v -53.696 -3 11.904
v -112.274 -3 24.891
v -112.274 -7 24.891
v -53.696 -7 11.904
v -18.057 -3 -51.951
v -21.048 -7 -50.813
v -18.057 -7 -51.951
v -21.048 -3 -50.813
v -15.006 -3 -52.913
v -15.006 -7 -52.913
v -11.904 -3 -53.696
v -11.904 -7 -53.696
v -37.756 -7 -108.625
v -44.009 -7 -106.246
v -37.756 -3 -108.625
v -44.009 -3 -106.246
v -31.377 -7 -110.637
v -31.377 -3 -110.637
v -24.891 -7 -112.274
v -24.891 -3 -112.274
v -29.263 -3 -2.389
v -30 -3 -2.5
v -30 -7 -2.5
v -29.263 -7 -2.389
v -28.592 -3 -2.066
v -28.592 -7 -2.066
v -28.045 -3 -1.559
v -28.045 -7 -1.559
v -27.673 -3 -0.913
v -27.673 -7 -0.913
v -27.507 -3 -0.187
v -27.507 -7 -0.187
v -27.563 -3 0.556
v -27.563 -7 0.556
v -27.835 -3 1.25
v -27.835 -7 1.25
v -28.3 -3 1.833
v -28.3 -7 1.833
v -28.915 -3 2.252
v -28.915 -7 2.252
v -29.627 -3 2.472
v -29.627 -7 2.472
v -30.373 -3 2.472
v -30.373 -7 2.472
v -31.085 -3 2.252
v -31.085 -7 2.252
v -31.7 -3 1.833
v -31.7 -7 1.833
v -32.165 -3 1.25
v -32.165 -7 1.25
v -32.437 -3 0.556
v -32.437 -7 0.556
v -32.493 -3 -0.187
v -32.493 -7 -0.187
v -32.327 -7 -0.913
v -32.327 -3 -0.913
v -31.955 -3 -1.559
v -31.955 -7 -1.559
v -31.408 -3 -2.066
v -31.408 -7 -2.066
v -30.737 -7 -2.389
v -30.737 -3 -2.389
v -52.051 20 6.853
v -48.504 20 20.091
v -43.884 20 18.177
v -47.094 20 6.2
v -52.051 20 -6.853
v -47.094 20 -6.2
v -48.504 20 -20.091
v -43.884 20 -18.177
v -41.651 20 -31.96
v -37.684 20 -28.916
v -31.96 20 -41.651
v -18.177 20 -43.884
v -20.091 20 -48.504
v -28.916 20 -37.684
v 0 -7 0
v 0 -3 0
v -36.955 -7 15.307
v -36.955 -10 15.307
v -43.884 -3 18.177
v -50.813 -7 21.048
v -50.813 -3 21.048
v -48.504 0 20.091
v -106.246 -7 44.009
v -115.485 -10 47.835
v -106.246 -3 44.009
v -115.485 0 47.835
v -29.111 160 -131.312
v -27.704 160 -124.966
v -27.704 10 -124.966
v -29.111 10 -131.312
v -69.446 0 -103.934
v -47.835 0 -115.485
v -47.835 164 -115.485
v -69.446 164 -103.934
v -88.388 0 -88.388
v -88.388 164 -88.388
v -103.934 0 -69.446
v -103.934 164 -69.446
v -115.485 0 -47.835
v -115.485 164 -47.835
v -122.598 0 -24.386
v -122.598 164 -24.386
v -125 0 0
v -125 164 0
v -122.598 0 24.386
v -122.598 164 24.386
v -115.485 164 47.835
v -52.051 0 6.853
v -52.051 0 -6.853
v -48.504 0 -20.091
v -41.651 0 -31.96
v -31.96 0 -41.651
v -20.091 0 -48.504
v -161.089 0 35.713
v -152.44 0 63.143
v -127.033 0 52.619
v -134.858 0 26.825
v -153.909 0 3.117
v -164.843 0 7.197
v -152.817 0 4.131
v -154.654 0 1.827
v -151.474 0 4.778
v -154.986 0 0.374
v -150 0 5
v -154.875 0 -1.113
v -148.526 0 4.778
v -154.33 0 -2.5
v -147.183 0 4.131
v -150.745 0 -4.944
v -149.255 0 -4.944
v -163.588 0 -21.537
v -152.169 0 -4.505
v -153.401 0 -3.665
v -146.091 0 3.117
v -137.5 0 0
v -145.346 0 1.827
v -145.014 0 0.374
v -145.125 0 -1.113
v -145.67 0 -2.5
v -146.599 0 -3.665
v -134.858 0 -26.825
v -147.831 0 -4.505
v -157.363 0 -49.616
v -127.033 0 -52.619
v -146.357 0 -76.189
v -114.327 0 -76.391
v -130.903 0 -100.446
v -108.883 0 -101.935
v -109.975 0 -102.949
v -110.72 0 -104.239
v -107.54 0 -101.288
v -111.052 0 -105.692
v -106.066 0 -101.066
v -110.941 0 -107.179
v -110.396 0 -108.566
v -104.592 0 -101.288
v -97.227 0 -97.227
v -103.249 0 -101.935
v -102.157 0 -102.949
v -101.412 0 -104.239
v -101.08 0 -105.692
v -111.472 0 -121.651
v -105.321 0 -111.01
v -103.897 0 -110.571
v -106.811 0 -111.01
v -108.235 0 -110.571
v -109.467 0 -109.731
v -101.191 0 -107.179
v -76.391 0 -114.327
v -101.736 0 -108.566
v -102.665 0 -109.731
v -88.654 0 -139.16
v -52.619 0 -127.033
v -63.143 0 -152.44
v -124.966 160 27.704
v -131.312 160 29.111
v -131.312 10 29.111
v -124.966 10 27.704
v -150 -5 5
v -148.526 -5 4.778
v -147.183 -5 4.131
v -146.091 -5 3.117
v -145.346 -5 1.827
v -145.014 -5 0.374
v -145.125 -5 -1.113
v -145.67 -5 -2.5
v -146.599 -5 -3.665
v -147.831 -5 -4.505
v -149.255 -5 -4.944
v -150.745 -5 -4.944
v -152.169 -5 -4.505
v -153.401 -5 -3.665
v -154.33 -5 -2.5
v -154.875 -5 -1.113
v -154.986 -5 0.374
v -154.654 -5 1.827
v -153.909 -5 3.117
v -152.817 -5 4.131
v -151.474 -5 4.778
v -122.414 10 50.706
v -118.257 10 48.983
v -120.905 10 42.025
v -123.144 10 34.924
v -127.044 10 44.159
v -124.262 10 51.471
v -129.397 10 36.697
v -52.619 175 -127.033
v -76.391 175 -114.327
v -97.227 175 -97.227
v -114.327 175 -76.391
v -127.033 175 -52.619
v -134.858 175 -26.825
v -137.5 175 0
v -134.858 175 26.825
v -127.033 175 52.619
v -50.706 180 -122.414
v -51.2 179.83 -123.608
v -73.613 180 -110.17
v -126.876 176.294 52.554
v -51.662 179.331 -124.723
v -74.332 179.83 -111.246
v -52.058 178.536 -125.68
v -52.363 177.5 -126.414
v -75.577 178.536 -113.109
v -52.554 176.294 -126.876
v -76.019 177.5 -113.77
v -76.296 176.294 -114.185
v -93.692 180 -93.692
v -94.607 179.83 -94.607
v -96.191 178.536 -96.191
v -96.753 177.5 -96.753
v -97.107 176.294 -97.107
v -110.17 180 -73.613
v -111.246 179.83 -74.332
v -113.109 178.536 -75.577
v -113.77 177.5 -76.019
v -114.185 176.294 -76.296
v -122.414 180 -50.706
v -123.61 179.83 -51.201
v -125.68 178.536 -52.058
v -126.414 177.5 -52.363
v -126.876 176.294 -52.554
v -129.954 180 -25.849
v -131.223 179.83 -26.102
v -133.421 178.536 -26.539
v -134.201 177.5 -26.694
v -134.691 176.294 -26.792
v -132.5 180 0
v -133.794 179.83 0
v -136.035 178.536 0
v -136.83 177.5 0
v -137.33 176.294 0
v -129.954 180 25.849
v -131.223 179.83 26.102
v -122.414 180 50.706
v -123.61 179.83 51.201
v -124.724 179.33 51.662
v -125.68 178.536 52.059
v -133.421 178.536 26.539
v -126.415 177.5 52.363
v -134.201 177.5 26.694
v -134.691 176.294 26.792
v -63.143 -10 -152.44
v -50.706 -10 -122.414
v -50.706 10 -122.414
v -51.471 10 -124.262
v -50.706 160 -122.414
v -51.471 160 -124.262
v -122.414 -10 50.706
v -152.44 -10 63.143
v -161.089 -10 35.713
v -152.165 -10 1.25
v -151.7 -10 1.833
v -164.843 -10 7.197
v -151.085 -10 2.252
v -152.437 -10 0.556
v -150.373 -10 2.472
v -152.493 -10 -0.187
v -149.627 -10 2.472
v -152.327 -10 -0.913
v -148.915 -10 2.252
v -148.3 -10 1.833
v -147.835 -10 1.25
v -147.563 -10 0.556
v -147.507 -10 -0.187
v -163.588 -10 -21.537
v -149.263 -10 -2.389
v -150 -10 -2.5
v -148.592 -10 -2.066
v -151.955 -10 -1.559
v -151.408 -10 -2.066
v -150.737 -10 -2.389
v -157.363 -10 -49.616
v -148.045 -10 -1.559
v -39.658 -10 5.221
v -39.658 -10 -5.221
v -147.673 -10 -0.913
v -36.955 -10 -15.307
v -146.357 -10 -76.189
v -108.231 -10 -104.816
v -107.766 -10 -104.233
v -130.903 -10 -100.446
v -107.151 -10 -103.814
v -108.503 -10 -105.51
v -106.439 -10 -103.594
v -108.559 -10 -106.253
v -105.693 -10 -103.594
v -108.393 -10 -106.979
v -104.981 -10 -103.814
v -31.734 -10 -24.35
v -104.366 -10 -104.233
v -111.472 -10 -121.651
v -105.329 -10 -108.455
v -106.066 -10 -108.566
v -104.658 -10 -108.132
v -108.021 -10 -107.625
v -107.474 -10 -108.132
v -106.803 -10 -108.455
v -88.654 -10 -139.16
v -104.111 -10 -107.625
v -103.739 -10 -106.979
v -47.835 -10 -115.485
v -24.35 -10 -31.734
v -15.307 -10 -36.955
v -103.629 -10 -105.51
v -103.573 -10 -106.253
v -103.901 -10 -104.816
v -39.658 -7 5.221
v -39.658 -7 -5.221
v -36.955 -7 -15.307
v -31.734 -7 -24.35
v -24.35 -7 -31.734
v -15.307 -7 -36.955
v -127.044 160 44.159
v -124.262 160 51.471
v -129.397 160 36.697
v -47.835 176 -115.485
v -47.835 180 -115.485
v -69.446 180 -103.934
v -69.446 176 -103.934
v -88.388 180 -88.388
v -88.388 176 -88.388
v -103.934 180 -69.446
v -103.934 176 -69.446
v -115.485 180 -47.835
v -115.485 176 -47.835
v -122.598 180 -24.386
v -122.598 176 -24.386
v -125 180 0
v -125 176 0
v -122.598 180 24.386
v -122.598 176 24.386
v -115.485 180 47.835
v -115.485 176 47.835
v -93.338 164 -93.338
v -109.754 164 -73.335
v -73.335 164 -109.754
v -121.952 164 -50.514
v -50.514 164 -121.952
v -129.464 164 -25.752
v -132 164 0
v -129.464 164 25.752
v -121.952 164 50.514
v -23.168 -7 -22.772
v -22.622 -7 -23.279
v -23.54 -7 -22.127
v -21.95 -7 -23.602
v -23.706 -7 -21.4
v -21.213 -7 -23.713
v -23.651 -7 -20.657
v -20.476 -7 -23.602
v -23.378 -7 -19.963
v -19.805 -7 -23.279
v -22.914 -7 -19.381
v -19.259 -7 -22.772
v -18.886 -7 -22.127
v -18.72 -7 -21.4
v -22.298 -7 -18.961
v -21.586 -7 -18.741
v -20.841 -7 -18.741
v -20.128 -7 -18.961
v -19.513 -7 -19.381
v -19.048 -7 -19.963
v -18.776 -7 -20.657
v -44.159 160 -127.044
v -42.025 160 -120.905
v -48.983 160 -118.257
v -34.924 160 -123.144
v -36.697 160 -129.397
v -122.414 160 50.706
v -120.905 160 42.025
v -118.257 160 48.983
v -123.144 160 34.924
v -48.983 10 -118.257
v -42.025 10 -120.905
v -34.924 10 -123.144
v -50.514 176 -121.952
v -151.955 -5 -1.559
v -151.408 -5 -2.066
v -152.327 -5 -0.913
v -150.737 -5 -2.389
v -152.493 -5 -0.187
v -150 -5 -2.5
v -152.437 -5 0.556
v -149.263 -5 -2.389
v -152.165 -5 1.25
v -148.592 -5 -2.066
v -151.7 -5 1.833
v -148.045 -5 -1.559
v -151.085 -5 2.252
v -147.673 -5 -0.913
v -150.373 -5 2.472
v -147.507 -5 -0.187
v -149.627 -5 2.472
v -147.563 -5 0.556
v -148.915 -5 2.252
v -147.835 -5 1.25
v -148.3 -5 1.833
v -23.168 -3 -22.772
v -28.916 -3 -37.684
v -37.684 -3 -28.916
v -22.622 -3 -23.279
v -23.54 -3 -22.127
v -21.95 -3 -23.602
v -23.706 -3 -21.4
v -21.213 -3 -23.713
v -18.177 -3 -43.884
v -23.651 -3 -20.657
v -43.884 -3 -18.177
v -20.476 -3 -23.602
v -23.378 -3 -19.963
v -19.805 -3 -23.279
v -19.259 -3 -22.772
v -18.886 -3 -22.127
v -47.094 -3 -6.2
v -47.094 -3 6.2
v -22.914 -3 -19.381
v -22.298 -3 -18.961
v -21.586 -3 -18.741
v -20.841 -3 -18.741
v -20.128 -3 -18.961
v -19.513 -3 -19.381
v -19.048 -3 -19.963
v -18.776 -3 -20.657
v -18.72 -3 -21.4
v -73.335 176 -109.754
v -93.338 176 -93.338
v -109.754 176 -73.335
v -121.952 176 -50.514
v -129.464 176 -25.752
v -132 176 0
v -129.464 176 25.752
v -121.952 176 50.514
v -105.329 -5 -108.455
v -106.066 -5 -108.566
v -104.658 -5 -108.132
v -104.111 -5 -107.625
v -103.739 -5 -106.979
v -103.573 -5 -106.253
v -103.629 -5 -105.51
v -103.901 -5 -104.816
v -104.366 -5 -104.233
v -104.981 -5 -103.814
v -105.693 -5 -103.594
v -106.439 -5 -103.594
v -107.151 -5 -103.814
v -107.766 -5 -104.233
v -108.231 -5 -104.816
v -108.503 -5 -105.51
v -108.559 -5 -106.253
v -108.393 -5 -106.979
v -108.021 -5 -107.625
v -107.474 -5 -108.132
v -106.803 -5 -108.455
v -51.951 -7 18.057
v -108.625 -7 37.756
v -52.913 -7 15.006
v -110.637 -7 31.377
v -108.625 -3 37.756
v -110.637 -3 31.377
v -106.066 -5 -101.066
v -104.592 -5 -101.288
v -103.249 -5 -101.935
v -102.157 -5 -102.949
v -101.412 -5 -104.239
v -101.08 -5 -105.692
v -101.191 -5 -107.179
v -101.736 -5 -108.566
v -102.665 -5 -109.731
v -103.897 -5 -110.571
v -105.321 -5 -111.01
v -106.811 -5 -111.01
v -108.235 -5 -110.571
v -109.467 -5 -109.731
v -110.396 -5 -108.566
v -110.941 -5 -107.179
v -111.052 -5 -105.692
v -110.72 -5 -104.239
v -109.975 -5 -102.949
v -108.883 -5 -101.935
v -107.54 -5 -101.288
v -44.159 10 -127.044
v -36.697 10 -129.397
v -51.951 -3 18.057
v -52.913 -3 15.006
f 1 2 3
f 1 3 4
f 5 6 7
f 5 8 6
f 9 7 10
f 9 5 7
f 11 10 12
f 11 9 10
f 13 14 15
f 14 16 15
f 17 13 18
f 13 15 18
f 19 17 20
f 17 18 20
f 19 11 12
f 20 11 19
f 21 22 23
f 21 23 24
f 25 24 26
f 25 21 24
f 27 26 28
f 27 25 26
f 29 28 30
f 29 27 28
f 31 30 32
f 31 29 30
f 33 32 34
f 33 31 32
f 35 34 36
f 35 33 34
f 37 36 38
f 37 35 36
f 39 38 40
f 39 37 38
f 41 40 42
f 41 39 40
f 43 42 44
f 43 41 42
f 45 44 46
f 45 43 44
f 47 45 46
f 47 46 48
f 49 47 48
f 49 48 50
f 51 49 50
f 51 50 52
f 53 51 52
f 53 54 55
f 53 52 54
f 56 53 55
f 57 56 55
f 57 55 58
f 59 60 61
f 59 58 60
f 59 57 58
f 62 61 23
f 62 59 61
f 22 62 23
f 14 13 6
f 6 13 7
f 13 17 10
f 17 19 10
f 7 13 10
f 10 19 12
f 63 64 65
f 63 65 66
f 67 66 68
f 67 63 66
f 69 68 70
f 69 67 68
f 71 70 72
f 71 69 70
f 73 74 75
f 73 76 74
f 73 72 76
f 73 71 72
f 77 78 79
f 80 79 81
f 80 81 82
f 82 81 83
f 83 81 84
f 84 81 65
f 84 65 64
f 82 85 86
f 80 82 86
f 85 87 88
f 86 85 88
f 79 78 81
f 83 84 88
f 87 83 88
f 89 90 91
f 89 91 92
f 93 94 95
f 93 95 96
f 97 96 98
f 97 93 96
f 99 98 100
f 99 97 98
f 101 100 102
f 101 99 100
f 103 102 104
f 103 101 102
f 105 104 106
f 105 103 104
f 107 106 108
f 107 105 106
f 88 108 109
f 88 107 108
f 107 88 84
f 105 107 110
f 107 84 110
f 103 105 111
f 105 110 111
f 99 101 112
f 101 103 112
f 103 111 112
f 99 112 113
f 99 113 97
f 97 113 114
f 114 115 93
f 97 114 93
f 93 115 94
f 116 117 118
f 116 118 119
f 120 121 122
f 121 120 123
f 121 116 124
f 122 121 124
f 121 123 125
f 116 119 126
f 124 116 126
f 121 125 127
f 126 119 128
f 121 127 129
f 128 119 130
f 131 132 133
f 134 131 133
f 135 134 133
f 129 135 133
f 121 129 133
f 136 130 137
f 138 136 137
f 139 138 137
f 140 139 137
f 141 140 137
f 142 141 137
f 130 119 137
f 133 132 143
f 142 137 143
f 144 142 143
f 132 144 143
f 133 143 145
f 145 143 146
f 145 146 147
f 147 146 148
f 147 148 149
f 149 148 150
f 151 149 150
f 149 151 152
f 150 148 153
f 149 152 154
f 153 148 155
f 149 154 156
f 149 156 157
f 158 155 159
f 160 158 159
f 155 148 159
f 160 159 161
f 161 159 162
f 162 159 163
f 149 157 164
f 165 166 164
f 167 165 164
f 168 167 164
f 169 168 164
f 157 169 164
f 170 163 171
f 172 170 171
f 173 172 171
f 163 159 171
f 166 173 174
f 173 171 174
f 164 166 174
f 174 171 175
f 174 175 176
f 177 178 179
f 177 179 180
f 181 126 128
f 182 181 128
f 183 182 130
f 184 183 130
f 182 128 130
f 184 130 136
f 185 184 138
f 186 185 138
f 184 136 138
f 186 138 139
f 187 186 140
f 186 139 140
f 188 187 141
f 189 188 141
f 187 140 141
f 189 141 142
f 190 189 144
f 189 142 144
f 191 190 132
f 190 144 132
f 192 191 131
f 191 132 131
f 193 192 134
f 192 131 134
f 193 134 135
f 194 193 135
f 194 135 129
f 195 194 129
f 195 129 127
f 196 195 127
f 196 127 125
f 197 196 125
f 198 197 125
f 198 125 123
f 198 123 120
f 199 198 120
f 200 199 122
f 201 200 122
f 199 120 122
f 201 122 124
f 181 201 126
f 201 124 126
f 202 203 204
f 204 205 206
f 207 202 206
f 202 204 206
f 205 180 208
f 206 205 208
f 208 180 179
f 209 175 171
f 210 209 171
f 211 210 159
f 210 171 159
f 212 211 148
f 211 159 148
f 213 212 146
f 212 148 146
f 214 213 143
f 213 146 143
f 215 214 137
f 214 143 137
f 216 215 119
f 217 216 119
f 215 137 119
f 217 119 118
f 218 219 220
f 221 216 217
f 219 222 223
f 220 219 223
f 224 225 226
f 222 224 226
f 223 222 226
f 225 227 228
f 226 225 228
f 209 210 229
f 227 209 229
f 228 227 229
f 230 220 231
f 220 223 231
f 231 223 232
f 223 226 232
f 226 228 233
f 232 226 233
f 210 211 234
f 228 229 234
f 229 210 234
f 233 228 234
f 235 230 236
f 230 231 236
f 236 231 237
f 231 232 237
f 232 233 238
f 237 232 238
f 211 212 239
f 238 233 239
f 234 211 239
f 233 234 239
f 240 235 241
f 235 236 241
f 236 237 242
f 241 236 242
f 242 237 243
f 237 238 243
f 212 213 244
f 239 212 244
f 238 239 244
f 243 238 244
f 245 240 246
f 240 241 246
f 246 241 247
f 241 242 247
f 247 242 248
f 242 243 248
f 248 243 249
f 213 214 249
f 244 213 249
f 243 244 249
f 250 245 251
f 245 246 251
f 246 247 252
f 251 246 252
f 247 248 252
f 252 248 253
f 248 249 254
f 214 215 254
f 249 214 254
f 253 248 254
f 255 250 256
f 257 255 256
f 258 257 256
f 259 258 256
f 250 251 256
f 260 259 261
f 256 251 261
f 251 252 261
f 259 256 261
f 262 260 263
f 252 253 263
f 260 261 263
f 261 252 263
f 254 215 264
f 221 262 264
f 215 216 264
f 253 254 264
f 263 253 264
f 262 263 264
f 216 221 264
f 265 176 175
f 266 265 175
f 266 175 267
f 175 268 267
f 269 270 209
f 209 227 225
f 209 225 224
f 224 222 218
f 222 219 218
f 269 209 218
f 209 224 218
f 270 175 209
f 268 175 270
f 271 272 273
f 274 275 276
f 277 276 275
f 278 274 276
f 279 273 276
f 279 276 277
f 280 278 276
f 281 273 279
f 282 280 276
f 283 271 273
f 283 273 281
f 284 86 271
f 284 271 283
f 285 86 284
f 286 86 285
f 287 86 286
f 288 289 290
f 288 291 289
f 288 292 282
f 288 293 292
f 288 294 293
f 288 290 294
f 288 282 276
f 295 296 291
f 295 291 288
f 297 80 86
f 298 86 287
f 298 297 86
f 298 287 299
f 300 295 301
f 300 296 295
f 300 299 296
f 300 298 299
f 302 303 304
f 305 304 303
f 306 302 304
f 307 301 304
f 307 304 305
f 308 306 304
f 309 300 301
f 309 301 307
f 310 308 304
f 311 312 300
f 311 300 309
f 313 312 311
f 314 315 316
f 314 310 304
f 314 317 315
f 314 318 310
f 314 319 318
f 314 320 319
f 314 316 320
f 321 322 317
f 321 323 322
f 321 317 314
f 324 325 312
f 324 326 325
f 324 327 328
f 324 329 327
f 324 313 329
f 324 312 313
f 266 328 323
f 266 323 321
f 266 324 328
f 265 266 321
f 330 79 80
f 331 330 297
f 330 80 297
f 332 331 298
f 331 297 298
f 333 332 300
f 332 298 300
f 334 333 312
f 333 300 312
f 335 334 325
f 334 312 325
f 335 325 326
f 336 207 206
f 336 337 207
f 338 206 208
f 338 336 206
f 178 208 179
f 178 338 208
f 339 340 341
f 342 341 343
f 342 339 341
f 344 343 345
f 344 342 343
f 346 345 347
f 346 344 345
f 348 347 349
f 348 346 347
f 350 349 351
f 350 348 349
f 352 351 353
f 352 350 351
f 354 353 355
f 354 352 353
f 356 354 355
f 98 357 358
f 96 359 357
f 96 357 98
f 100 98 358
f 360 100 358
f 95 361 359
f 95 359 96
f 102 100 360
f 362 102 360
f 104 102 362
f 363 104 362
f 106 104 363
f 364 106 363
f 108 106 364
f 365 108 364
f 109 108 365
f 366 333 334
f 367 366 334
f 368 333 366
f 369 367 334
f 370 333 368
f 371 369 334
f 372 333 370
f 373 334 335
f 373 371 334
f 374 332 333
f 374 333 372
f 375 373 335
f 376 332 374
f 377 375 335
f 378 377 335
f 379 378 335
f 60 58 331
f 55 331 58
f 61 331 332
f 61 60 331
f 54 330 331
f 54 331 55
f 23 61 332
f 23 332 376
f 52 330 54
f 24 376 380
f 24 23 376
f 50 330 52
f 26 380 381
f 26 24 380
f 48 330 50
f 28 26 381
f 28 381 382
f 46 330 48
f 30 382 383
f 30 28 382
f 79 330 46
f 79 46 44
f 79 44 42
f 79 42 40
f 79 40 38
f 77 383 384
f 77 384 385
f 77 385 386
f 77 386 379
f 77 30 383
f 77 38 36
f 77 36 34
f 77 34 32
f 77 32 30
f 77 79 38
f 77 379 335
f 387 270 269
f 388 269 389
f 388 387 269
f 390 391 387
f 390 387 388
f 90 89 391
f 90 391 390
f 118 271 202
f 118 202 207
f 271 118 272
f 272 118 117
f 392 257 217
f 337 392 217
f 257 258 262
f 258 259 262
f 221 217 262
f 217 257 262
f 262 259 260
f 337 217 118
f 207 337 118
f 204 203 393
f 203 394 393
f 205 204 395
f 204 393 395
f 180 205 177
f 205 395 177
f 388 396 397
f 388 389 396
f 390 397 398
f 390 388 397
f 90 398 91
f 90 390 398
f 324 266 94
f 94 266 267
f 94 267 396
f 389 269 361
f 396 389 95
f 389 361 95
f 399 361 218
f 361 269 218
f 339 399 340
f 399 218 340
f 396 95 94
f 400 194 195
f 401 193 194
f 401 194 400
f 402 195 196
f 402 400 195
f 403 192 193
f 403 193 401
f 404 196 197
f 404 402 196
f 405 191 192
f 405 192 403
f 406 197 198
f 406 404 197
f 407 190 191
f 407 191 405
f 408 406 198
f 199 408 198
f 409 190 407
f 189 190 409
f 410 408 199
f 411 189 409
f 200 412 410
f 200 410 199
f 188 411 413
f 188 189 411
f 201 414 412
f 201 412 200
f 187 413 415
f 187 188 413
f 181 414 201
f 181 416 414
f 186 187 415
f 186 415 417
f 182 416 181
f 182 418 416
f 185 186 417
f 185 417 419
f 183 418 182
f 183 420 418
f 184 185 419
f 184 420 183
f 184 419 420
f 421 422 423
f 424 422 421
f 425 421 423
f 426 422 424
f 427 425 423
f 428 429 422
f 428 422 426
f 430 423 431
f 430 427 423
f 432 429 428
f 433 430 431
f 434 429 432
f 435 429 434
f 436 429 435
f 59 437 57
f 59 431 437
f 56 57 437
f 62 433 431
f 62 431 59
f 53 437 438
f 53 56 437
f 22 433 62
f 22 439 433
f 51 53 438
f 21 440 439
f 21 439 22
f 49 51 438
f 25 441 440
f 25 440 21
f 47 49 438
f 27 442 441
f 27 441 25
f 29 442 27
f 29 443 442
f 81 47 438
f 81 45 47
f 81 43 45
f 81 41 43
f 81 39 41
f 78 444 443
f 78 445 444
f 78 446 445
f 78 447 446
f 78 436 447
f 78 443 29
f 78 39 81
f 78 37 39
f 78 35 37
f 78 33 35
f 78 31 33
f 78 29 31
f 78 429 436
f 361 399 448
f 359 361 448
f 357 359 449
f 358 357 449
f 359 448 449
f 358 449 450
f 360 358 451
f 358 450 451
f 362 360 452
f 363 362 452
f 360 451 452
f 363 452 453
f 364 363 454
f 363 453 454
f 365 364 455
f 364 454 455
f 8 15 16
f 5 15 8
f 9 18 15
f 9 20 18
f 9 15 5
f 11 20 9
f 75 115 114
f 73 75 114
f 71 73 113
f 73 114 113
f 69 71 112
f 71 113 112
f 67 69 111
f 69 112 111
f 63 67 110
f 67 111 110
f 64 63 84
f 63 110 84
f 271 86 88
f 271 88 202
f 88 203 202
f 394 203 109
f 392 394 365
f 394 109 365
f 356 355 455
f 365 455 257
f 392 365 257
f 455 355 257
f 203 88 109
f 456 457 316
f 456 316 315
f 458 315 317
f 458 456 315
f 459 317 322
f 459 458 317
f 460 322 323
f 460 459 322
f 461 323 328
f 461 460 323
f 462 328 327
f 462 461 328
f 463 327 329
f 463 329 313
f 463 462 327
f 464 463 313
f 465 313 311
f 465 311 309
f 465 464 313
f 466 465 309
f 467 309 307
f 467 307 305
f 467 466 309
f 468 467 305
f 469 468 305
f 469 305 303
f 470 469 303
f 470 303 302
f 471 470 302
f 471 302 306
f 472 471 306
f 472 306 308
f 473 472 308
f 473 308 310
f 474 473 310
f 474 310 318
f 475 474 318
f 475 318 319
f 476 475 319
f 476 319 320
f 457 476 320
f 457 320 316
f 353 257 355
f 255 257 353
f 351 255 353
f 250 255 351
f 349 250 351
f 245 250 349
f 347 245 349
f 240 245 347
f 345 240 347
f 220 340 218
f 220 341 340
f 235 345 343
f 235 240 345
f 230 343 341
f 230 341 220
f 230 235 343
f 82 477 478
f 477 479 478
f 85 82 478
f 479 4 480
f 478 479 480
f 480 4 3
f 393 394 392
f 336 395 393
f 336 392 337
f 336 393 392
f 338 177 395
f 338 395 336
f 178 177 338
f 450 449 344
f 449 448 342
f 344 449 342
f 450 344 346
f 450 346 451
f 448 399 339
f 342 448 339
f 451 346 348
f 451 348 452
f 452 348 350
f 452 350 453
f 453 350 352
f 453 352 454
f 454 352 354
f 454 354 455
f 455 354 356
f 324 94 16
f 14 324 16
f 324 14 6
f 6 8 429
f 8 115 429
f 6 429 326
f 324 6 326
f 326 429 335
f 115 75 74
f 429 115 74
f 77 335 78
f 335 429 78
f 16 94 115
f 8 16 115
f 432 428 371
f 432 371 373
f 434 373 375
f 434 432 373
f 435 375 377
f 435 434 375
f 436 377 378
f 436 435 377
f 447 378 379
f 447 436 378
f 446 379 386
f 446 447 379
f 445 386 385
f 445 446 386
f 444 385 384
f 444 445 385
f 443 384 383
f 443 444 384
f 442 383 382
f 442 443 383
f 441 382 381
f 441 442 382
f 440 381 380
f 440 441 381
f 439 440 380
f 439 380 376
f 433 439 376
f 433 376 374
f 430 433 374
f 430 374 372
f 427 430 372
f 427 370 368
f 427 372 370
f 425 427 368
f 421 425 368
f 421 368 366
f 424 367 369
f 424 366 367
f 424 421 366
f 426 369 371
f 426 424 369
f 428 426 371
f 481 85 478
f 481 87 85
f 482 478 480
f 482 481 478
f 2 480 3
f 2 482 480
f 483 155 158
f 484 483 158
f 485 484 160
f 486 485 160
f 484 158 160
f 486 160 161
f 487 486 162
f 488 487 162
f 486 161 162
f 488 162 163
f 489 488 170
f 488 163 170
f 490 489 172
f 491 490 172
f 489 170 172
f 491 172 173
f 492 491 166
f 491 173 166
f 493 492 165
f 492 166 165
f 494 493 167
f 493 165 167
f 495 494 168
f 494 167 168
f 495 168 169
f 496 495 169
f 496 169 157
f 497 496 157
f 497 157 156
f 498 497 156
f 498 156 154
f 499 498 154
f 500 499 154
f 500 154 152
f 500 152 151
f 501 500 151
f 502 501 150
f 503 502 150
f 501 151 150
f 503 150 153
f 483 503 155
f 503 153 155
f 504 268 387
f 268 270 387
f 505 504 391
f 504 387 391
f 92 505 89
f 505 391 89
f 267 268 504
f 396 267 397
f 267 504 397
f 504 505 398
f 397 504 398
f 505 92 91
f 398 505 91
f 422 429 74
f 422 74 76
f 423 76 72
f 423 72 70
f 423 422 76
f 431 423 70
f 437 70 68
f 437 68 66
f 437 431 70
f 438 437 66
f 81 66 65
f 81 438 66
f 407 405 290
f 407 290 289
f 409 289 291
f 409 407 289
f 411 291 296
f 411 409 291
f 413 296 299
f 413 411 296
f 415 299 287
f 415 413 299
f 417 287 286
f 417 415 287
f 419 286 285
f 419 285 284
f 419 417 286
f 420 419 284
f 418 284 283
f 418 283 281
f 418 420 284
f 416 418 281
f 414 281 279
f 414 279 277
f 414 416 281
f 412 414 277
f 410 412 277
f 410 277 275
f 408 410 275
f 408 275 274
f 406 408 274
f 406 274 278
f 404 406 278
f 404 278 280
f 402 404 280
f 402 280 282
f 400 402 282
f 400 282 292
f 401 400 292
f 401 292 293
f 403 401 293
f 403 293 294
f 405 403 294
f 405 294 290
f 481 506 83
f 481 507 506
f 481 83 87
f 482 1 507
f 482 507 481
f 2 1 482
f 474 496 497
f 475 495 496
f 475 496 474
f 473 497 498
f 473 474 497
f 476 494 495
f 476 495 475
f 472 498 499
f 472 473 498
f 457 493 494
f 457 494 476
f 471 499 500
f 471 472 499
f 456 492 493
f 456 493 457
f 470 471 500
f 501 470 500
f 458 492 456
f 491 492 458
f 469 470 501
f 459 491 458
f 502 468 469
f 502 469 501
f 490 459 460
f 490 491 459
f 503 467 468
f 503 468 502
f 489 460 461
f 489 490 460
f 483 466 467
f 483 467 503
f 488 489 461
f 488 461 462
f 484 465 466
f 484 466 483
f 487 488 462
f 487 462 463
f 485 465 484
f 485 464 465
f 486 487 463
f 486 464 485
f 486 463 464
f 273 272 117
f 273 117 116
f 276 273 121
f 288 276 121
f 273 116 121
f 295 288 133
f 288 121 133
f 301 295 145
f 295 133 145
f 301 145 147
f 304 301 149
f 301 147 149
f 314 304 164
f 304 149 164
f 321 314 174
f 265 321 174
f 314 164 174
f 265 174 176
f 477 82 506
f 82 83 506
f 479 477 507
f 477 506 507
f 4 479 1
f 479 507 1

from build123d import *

# Parameters (mm, degrees)
SKETCH1_R           = 137.5
SKETCH1_R_2         = 125
BOSS_EXTRUDE1_DEPTH = 180
SKETCH2_R           = 165
SKETCH2_R_2         = 2.5
BOSS_EXTRUDE2_DEPTH = 10
SKETCH3_R           = 52.5
SKETCH3_R_2         = 47.5
BOSS_EXTRUDE3_DEPTH = 20
SKETCH4_W           = 56
SKETCH4_H           = 96
CUT_EXTRUDE4_DEPTH  = 150
SKETCH5_W           = 56
SKETCH5_H           = 10
BOSS_EXTRUDE4_DEPTH = 56
SKETCH6_W           = 56
SKETCH6_H           = 56
BOSS_EXTRUDE5_DEPTH = 10
SKETCH7_R           = 2.5
SKETCH7_R_2         = 12.5
CUT_EXTRUDE5_DEPTH  = 10
SKETCH8_W           = 56
SKETCH8_H           = 86
BOSS_EXTRUDE6_DEPTH = 5
FILLET1_R           = 10
FILLET2_R           = 5
SKETCH9_W           = 31.730677801
SKETCH9_H           = 6
CUT_EXTRUDE6_DEPTH  = 10
FILLET3_R           = 5
CUT_EXTRUDE7_START  = -3
SKETCH10_R          = 47.5
CUT_EXTRUDE7_DEPTH  = 3
SKETCH11_R          = 5
CUT_EXTRUDE8_DEPTH  = 5
SKETCH13_W          = 14
SKETCH13_H          = 12
CUT_EXTRUDE9_DEPTH  = 301.915270467
SKETCH15_W          = 6.5
SKETCH15_H          = 150
SKETCH15_W_2        = 60
SKETCH15_H_2        = 4
REVOLVE1_ANGLE      = 10
SKETCH16_W          = 6.5
SKETCH16_H          = 150
SKETCH16_W_2        = 60
SKETCH16_H_2        = 4
CUT_REVOLVE2_ANGLE  = 10
SKETCH17_R          = 40
CUT_EXTRUDE10_DEPTH = 3


with BuildPart() as part:
    # Sketch1 → Boss-Extrude1 (new body)
    with BuildSketch(Plane(origin=(0, 0, 0), x_dir=(1, 0, 0), z_dir=(0, 1, 0))):
        with Locations(Location((0, 0, 0), (0, 0, 90))):
            Circle(SKETCH1_R)
        with Locations(Location((0, 0, 0), (0, 0, 90))):
            Circle(SKETCH1_R_2, mode=Mode.SUBTRACT)
    extrude(amount=BOSS_EXTRUDE1_DEPTH)

    # Sketch2 → Boss-Extrude2 (add)
    with BuildSketch(Plane.XZ):
        with Locations(Location((0, 0, 0), (0, 0, 270))):
            Circle(SKETCH2_R)
        with Locations(Location((0, 150, 0), (0, 0, 270))):
            Circle(SKETCH2_R_2, mode=Mode.SUBTRACT)
        with Locations(Location((0, 30, 0), (0, 0, 270))):
            Circle(SKETCH2_R_2, mode=Mode.SUBTRACT)
        with Locations(Location((106.066017178, 106.066017178, 0), (0, 0, 270))):
            Circle(SKETCH2_R_2, mode=Mode.SUBTRACT)
        with Locations(Location((150, 0, 0), (0, 0, 270))):
            Circle(SKETCH2_R_2, mode=Mode.SUBTRACT)
        with Locations(Location((106.066017178, -106.066017178, 0), (0, 0, 270))):
            Circle(SKETCH2_R_2, mode=Mode.SUBTRACT)
        with Locations(Location((0, -150, 0), (0, 0, 270))):
            Circle(SKETCH2_R_2, mode=Mode.SUBTRACT)
        with Locations(Location((-106.066017178, -106.066017178, 0), (0, 0, 270))):
            Circle(SKETCH2_R_2, mode=Mode.SUBTRACT)
        with Locations(Location((-150, 0, 0), (0, 0, 270))):
            Circle(SKETCH2_R_2, mode=Mode.SUBTRACT)
        with Locations(Location((-106.066017178, 106.066017178, 0), (0, 0, 270))):
            Circle(SKETCH2_R_2, mode=Mode.SUBTRACT)
        with Locations(Location((21.213203436, 21.213203436, 0), (0, 0, 270))):
            Circle(SKETCH2_R_2, mode=Mode.SUBTRACT)
        with Locations(Location((30, 0, 0), (0, 0, 270))):
            Circle(SKETCH2_R_2, mode=Mode.SUBTRACT)
        with Locations(Location((21.213203436, -21.213203436, 0), (0, 0, 270))):
            Circle(SKETCH2_R_2, mode=Mode.SUBTRACT)
        with Locations(Location((0, -30, 0), (0, 0, 270))):
            Circle(SKETCH2_R_2, mode=Mode.SUBTRACT)
        with Locations(Location((-21.213203436, -21.213203436, 0), (0, 0, 270))):
            Circle(SKETCH2_R_2, mode=Mode.SUBTRACT)
        with Locations(Location((-30, 0, 0), (0, 0, 270))):
            Circle(SKETCH2_R_2, mode=Mode.SUBTRACT)
        with Locations(Location((-21.213203436, 21.213203436, 0), (0, 0, 270))):
            Circle(SKETCH2_R_2, mode=Mode.SUBTRACT)
    extrude(amount=BOSS_EXTRUDE2_DEPTH)

    # Sketch3 → Boss-Extrude3 (add)
    with BuildSketch(Plane(origin=(0, 0, 0), x_dir=(1, 0, 0), z_dir=(0, 1, 0))):
        with Locations(Location((0, 0, 0), (0, 0, 90))):
            Circle(SKETCH3_R)
        with Locations(Location((0, 0, 0), (0, 0, 270))):
            Circle(SKETCH3_R_2, mode=Mode.SUBTRACT)
    extrude(amount=BOSS_EXTRUDE3_DEPTH)

    # Sketch4 → Cut-Extrude4 (cut)
    with BuildSketch(Plane(origin=(0, 0, 0), x_dir=(0, 0, -1), z_dir=(1, 0, 0))):
        with Locations((0, 112)):
            Rectangle(SKETCH4_W, SKETCH4_H)
    extrude(amount=CUT_EXTRUDE4_DEPTH, mode=Mode.SUBTRACT)

    # Sketch5 → Boss-Extrude4 (add)
    with BuildSketch(Plane(origin=(0, 0, 28), x_dir=(-1, 0, 0), z_dir=(0, 0, -1))):
        with Locations((-121.823643025, 135)):
            Rectangle(SKETCH5_W, SKETCH5_H)
    extrude(amount=BOSS_EXTRUDE4_DEPTH)

    # Sketch6 → Boss-Extrude5 (add)
    with BuildSketch(Plane(origin=(0, 64, 0), x_dir=(1, 0, 0), z_dir=(0, 1, 0))):
        with Locations((121.823643025, 0)):
            Rectangle(SKETCH6_W, SKETCH6_H)
    extrude(amount=-BOSS_EXTRUDE5_DEPTH)

    # Sketch7 → Cut-Extrude5 (cut)
    with BuildSketch(Plane(origin=(0, 140, 0), x_dir=(1, 0, 0), z_dir=(0, 1, 0))):
        with Locations(Location((98.273643025, 23.55, 0), (0, 0, 270))):
            Circle(SKETCH7_R)
        with Locations(Location((145.373643025, 23.55, 0), (0, 0, 270))):
            Circle(SKETCH7_R)
        with Locations(Location((98.273643025, -23.55, 0), (0, 0, 270))):
            Circle(SKETCH7_R)
        with Locations(Location((145.373643025, -23.55, 0), (0, 0, 270))):
            Circle(SKETCH7_R)
        with Locations(Location((121.823643025, 0, 0), (0, 0, 270))):
            Circle(SKETCH7_R_2)
    extrude(amount=-CUT_EXTRUDE5_DEPTH, mode=Mode.SUBTRACT)

    # Sketch8 → Boss-Extrude6 (add)
    with BuildSketch(Plane(origin=(149.823643025, 0, 0), x_dir=(0, 0, -1), z_dir=(1, 0, 0))):
        with Locations((0, 97)):
            Rectangle(SKETCH8_W, SKETCH8_H)
    extrude(amount=BOSS_EXTRUDE6_DEPTH)

    # Fillet1
    # the kernel refuses this fillet: 10 mm, written as the material it takes off along each edge
    with BuildSketch(Plane(origin=(154.823643025, 165, -28), x_dir=(0, 0, 1), z_dir=(0, -1, 0))) as fillet1_piece_1:
        with BuildLine():
            CenterArc((FILLET1_R, FILLET1_R), FILLET1_R, 180, 90)
            Line((0, FILLET1_R), (0, 0))
            Line((0, 0), (FILLET1_R, 0))
        make_face()
    extrude(amount=136, mode=Mode.SUBTRACT)
    with BuildSketch(Plane(origin=(154.823643025, 29, 28), x_dir=(-1, 0, 0), z_dir=(0, 1, 0))) as fillet1_piece_2:
        with BuildLine():
            CenterArc((FILLET1_R, -FILLET1_R), FILLET1_R, 90, 90)
            Line((0, -FILLET1_R), (0, 0))
            Line((0, 0), (FILLET1_R, 0))
        make_face()
    extrude(amount=136, mode=Mode.SUBTRACT)

    # Fillet2
    fillet2_edges = [part.edges().sort_by_distance(p)[0] for p in [
        (93.823643025, 59, 28),
        (93.823643025, 59, -28),
        (93.823643025, 135, -28),
        (93.823643025, 135, 28),
    ]]
    fillet(fillet2_edges, radius=FILLET2_R)

    # Sketch9 → Cut-Extrude6 (cut)
    with BuildSketch(Plane(origin=(0, 140, 0), x_dir=(1, 0, 0), z_dir=(0, 1, 0))):
        with Locations((93.823643026, 0)):
            Rectangle(SKETCH9_W, SKETCH9_H)
    extrude(amount=-CUT_EXTRUDE6_DEPTH, mode=Mode.SUBTRACT)

    # Fillet3
    fillet3_edges = [part.edges().sort_by_distance(p)[0] for p in [
        (0, 180, 137.5),
    ]]
    fillet(fillet3_edges, radius=FILLET3_R)

    # Sketch10 → Cut-Extrude7 (cut)
    with BuildSketch(Plane(origin=(0, 0, 0), x_dir=(1, 0, 0), z_dir=(0, 1, 0)).offset(CUT_EXTRUDE7_START)):
        with Locations(Location((0, 0, 0), (0, 0, 270))):
            Circle(SKETCH10_R)
    extrude(amount=CUT_EXTRUDE7_DEPTH, mode=Mode.SUBTRACT)

    # Sketch11 → Cut-Extrude8 (cut)
    with BuildSketch(Plane(origin=(0, 0, 0), x_dir=(1, 0, 0), z_dir=(0, 1, 0))):
        with Locations(Location((0, 150, 0), (0, 0, 270))):
            Circle(SKETCH11_R)
        with Locations(Location((106.066017178, 106.066017178, 0), (0, 0, 270))):
            Circle(SKETCH11_R)
        with Locations(Location((150, 0, 0), (0, 0, 270))):
            Circle(SKETCH11_R)
        with Locations(Location((106.066017178, -106.066017178, 0), (0, 0, 270))):
            Circle(SKETCH11_R)
        with Locations(Location((0, -150, 0), (0, 0, 270))):
            Circle(SKETCH11_R)
        with Locations(Location((-106.066017178, -106.066017178, 0), (0, 0, 270))):
            Circle(SKETCH11_R)
        with Locations(Location((-150, 0, 0), (0, 0, 270))):
            Circle(SKETCH11_R)
        with Locations(Location((-106.066017178, 106.066017178, 0), (0, 0, 270))):
            Circle(SKETCH11_R)
    extrude(amount=-CUT_EXTRUDE8_DEPTH, mode=Mode.SUBTRACT)

    # Sketch13 → Cut-Revolve1 (revolve, cut)
    with BuildSketch(Plane.XY, mode=Mode.PRIVATE) as cut_revolve1_sk:
        with Locations((-125, 170)):
            Rectangle(SKETCH13_W, SKETCH13_H)
    revolve(cut_revolve1_sk.sketch.rotate(Axis((0, 0, 0), (0, 1, 0)), 90), axis=Axis((0, 0, 0), (0, 1, 0)), mode=Mode.SUBTRACT)

    # Sketch14 → Cut-Extrude9 (cut, through all)
    with BuildSketch(Plane(origin=(0, 180, 0), x_dir=(1, 0, 0), z_dir=(0, 1, 0))):
        with BuildLine():
            Line((-47.835429046, 115.484941564), (0, 0))
            Line((0, 0), (115.484941564, 47.835429046))
            ThreePointArc((115.484941564, 47.835429046), (47.835429046, 115.484941564), (-47.835429046, 115.484941564))
        make_face()
        with BuildLine():
            ThreePointArc((-47.835429046, 115.484941564), (47.835429046, 115.484941564), (115.484941564, 47.835429046))
            Line((115.484941564, 47.835429046), (122.414038058, 50.705554788))
            ThreePointArc((122.414038058, 50.705554788), (50.705554788, 122.414038058), (-50.705554788, 122.414038058))
            Line((-50.705554788, 122.414038058), (-47.835429046, 115.484941564))
        make_face()
        with BuildLine():
            ThreePointArc((-50.705554788, 122.414038058), (50.705554788, 122.414038058), (122.414038058, 50.705554788))
            Line((122.414038058, 50.705554788), (152.440122864, 63.14276634))
            ThreePointArc((152.440122864, 63.14276634), (63.14276634, 152.440122864), (-63.14276634, 152.440122864))
            Line((-63.14276634, 152.440122864), (-50.705554788, 122.414038058))
        make_face()
        with BuildLine():
            Line((152.440122864, 63.14276634), (122.414038058, 50.705554788))
            ThreePointArc((122.414038058, 50.705554788), (129.954049653, 25.849467667), (132.5, 0))
            Line((132.5, 0), (165, 0))
            ThreePointArc((165, 0), (161.829571267, 32.189903133), (152.440122864, 63.14276634))
        make_face()
        with BuildLine():
            Line((115.484941564, 47.835429046), (0, 0))
            Line((0, 0), (125, 0))
            ThreePointArc((125, 0), (122.59816005, 24.386290252), (115.484941564, 47.835429046))
        make_face()
        with BuildLine():
            Line((122.414038058, 50.705554788), (115.484941564, 47.835429046))
            ThreePointArc((115.484941564, 47.835429046), (122.59816005, 24.386290252), (125, 0))
            Line((125, 0), (132.5, 0))
            ThreePointArc((132.5, 0), (129.954049653, 25.849467667), (122.414038058, 50.705554788))
        make_face()
        with BuildLine():
            ThreePointArc((132.5, 0), (110.16972363, -73.613055875), (50.705554788, -122.414038058))
            Line((50.705554788, -122.414038058), (63.14276634, -152.440122864))
            ThreePointArc((63.14276634, -152.440122864), (137.19248603, -91.669088448), (165, 0))
            Line((165, 0), (132.5, 0))
        make_face()
        with BuildLine():
            ThreePointArc((125, 0), (103.933701538, -69.446279127), (47.835429046, -115.484941564))
            Line((47.835429046, -115.484941564), (50.705554788, -122.414038058))
            ThreePointArc((50.705554788, -122.414038058), (110.16972363, -73.613055875), (132.5, 0))
            Line((132.5, 0), (125, 0))
        make_face()
        with BuildLine():
            Line((125, 0), (0, 0))
            Line((0, 0), (47.835429046, -115.484941564))
            ThreePointArc((47.835429046, -115.484941564), (103.933701538, -69.446279127), (125, 0))
        make_face()
        with BuildLine():
            ThreePointArc((50.705554788, -122.414038058), (-50.705554788, -122.414038058), (-122.414038058, -50.705554788))
            Line((-122.414038058, -50.705554788), (-152.440122864, -63.14276634))
            ThreePointArc((-152.440122864, -63.14276634), (-63.14276634, -152.440122864), (63.14276634, -152.440122864))
            Line((63.14276634, -152.440122864), (50.705554788, -122.414038058))
        make_face()
        with BuildLine():
            ThreePointArc((47.835429046, -115.484941564), (-47.835429046, -115.484941564), (-115.484941564, -47.835429046))
            Line((-115.484941564, -47.835429046), (-122.414038058, -50.705554788))
            ThreePointArc((-122.414038058, -50.705554788), (-50.705554788, -122.414038058), (50.705554788, -122.414038058))
            Line((50.705554788, -122.414038058), (47.835429046, -115.484941564))
        make_face()
        with BuildLine():
            Line((47.835429046, -115.484941564), (0, 0))
            Line((0, 0), (-115.484941564, -47.835429046))
            ThreePointArc((-115.484941564, -47.835429046), (-47.835429046, -115.484941564), (47.835429046, -115.484941564))
        make_face()
    extrude(amount=-CUT_EXTRUDE9_DEPTH, mode=Mode.SUBTRACT)

    # Sketch15 → Revolve1 (revolve)
    with BuildSketch(Plane(origin=(0, 0, 0), x_dir=(-0.38268343236509034, 0, -0.9238795325112865), z_dir=(0.9238795325112865, 0, -0.38268343236509034))):
        with Locations((131.25, 85)):
            Rectangle(SKETCH15_W, SKETCH15_H)
        with Locations((85, -5)):
            Rectangle(SKETCH15_W_2, SKETCH15_H_2)
    revolve(axis=Axis((0, 0, 0), (0, -1, 0)), revolution_arc=REVOLVE1_ANGLE)

    # Sketch16 → Cut-Revolve2 (revolve, cut)
    with BuildSketch(Plane(origin=(0, 0, 0), x_dir=(0.9238795325112864, 0, -0.3826834323650908), z_dir=(0.3826834323650908, 0, 0.9238795325112864))):
        with Locations((-131.25, 85)):
            Rectangle(SKETCH16_W, SKETCH16_H)
        with Locations((-85, -5)):
            Rectangle(SKETCH16_W_2, SKETCH16_H_2)
    revolve(axis=Axis((0, 0, 0), (0, -1, 0)), revolution_arc=CUT_REVOLVE2_ANGLE, mode=Mode.SUBTRACT)

    # Sketch17 → Cut-Extrude10 (cut)
    with BuildSketch(Plane.XZ.offset(10)):
        Circle(SKETCH17_R)
    extrude(amount=-CUT_EXTRUDE10_DEPTH, mode=Mode.SUBTRACT)


solid = part.part
